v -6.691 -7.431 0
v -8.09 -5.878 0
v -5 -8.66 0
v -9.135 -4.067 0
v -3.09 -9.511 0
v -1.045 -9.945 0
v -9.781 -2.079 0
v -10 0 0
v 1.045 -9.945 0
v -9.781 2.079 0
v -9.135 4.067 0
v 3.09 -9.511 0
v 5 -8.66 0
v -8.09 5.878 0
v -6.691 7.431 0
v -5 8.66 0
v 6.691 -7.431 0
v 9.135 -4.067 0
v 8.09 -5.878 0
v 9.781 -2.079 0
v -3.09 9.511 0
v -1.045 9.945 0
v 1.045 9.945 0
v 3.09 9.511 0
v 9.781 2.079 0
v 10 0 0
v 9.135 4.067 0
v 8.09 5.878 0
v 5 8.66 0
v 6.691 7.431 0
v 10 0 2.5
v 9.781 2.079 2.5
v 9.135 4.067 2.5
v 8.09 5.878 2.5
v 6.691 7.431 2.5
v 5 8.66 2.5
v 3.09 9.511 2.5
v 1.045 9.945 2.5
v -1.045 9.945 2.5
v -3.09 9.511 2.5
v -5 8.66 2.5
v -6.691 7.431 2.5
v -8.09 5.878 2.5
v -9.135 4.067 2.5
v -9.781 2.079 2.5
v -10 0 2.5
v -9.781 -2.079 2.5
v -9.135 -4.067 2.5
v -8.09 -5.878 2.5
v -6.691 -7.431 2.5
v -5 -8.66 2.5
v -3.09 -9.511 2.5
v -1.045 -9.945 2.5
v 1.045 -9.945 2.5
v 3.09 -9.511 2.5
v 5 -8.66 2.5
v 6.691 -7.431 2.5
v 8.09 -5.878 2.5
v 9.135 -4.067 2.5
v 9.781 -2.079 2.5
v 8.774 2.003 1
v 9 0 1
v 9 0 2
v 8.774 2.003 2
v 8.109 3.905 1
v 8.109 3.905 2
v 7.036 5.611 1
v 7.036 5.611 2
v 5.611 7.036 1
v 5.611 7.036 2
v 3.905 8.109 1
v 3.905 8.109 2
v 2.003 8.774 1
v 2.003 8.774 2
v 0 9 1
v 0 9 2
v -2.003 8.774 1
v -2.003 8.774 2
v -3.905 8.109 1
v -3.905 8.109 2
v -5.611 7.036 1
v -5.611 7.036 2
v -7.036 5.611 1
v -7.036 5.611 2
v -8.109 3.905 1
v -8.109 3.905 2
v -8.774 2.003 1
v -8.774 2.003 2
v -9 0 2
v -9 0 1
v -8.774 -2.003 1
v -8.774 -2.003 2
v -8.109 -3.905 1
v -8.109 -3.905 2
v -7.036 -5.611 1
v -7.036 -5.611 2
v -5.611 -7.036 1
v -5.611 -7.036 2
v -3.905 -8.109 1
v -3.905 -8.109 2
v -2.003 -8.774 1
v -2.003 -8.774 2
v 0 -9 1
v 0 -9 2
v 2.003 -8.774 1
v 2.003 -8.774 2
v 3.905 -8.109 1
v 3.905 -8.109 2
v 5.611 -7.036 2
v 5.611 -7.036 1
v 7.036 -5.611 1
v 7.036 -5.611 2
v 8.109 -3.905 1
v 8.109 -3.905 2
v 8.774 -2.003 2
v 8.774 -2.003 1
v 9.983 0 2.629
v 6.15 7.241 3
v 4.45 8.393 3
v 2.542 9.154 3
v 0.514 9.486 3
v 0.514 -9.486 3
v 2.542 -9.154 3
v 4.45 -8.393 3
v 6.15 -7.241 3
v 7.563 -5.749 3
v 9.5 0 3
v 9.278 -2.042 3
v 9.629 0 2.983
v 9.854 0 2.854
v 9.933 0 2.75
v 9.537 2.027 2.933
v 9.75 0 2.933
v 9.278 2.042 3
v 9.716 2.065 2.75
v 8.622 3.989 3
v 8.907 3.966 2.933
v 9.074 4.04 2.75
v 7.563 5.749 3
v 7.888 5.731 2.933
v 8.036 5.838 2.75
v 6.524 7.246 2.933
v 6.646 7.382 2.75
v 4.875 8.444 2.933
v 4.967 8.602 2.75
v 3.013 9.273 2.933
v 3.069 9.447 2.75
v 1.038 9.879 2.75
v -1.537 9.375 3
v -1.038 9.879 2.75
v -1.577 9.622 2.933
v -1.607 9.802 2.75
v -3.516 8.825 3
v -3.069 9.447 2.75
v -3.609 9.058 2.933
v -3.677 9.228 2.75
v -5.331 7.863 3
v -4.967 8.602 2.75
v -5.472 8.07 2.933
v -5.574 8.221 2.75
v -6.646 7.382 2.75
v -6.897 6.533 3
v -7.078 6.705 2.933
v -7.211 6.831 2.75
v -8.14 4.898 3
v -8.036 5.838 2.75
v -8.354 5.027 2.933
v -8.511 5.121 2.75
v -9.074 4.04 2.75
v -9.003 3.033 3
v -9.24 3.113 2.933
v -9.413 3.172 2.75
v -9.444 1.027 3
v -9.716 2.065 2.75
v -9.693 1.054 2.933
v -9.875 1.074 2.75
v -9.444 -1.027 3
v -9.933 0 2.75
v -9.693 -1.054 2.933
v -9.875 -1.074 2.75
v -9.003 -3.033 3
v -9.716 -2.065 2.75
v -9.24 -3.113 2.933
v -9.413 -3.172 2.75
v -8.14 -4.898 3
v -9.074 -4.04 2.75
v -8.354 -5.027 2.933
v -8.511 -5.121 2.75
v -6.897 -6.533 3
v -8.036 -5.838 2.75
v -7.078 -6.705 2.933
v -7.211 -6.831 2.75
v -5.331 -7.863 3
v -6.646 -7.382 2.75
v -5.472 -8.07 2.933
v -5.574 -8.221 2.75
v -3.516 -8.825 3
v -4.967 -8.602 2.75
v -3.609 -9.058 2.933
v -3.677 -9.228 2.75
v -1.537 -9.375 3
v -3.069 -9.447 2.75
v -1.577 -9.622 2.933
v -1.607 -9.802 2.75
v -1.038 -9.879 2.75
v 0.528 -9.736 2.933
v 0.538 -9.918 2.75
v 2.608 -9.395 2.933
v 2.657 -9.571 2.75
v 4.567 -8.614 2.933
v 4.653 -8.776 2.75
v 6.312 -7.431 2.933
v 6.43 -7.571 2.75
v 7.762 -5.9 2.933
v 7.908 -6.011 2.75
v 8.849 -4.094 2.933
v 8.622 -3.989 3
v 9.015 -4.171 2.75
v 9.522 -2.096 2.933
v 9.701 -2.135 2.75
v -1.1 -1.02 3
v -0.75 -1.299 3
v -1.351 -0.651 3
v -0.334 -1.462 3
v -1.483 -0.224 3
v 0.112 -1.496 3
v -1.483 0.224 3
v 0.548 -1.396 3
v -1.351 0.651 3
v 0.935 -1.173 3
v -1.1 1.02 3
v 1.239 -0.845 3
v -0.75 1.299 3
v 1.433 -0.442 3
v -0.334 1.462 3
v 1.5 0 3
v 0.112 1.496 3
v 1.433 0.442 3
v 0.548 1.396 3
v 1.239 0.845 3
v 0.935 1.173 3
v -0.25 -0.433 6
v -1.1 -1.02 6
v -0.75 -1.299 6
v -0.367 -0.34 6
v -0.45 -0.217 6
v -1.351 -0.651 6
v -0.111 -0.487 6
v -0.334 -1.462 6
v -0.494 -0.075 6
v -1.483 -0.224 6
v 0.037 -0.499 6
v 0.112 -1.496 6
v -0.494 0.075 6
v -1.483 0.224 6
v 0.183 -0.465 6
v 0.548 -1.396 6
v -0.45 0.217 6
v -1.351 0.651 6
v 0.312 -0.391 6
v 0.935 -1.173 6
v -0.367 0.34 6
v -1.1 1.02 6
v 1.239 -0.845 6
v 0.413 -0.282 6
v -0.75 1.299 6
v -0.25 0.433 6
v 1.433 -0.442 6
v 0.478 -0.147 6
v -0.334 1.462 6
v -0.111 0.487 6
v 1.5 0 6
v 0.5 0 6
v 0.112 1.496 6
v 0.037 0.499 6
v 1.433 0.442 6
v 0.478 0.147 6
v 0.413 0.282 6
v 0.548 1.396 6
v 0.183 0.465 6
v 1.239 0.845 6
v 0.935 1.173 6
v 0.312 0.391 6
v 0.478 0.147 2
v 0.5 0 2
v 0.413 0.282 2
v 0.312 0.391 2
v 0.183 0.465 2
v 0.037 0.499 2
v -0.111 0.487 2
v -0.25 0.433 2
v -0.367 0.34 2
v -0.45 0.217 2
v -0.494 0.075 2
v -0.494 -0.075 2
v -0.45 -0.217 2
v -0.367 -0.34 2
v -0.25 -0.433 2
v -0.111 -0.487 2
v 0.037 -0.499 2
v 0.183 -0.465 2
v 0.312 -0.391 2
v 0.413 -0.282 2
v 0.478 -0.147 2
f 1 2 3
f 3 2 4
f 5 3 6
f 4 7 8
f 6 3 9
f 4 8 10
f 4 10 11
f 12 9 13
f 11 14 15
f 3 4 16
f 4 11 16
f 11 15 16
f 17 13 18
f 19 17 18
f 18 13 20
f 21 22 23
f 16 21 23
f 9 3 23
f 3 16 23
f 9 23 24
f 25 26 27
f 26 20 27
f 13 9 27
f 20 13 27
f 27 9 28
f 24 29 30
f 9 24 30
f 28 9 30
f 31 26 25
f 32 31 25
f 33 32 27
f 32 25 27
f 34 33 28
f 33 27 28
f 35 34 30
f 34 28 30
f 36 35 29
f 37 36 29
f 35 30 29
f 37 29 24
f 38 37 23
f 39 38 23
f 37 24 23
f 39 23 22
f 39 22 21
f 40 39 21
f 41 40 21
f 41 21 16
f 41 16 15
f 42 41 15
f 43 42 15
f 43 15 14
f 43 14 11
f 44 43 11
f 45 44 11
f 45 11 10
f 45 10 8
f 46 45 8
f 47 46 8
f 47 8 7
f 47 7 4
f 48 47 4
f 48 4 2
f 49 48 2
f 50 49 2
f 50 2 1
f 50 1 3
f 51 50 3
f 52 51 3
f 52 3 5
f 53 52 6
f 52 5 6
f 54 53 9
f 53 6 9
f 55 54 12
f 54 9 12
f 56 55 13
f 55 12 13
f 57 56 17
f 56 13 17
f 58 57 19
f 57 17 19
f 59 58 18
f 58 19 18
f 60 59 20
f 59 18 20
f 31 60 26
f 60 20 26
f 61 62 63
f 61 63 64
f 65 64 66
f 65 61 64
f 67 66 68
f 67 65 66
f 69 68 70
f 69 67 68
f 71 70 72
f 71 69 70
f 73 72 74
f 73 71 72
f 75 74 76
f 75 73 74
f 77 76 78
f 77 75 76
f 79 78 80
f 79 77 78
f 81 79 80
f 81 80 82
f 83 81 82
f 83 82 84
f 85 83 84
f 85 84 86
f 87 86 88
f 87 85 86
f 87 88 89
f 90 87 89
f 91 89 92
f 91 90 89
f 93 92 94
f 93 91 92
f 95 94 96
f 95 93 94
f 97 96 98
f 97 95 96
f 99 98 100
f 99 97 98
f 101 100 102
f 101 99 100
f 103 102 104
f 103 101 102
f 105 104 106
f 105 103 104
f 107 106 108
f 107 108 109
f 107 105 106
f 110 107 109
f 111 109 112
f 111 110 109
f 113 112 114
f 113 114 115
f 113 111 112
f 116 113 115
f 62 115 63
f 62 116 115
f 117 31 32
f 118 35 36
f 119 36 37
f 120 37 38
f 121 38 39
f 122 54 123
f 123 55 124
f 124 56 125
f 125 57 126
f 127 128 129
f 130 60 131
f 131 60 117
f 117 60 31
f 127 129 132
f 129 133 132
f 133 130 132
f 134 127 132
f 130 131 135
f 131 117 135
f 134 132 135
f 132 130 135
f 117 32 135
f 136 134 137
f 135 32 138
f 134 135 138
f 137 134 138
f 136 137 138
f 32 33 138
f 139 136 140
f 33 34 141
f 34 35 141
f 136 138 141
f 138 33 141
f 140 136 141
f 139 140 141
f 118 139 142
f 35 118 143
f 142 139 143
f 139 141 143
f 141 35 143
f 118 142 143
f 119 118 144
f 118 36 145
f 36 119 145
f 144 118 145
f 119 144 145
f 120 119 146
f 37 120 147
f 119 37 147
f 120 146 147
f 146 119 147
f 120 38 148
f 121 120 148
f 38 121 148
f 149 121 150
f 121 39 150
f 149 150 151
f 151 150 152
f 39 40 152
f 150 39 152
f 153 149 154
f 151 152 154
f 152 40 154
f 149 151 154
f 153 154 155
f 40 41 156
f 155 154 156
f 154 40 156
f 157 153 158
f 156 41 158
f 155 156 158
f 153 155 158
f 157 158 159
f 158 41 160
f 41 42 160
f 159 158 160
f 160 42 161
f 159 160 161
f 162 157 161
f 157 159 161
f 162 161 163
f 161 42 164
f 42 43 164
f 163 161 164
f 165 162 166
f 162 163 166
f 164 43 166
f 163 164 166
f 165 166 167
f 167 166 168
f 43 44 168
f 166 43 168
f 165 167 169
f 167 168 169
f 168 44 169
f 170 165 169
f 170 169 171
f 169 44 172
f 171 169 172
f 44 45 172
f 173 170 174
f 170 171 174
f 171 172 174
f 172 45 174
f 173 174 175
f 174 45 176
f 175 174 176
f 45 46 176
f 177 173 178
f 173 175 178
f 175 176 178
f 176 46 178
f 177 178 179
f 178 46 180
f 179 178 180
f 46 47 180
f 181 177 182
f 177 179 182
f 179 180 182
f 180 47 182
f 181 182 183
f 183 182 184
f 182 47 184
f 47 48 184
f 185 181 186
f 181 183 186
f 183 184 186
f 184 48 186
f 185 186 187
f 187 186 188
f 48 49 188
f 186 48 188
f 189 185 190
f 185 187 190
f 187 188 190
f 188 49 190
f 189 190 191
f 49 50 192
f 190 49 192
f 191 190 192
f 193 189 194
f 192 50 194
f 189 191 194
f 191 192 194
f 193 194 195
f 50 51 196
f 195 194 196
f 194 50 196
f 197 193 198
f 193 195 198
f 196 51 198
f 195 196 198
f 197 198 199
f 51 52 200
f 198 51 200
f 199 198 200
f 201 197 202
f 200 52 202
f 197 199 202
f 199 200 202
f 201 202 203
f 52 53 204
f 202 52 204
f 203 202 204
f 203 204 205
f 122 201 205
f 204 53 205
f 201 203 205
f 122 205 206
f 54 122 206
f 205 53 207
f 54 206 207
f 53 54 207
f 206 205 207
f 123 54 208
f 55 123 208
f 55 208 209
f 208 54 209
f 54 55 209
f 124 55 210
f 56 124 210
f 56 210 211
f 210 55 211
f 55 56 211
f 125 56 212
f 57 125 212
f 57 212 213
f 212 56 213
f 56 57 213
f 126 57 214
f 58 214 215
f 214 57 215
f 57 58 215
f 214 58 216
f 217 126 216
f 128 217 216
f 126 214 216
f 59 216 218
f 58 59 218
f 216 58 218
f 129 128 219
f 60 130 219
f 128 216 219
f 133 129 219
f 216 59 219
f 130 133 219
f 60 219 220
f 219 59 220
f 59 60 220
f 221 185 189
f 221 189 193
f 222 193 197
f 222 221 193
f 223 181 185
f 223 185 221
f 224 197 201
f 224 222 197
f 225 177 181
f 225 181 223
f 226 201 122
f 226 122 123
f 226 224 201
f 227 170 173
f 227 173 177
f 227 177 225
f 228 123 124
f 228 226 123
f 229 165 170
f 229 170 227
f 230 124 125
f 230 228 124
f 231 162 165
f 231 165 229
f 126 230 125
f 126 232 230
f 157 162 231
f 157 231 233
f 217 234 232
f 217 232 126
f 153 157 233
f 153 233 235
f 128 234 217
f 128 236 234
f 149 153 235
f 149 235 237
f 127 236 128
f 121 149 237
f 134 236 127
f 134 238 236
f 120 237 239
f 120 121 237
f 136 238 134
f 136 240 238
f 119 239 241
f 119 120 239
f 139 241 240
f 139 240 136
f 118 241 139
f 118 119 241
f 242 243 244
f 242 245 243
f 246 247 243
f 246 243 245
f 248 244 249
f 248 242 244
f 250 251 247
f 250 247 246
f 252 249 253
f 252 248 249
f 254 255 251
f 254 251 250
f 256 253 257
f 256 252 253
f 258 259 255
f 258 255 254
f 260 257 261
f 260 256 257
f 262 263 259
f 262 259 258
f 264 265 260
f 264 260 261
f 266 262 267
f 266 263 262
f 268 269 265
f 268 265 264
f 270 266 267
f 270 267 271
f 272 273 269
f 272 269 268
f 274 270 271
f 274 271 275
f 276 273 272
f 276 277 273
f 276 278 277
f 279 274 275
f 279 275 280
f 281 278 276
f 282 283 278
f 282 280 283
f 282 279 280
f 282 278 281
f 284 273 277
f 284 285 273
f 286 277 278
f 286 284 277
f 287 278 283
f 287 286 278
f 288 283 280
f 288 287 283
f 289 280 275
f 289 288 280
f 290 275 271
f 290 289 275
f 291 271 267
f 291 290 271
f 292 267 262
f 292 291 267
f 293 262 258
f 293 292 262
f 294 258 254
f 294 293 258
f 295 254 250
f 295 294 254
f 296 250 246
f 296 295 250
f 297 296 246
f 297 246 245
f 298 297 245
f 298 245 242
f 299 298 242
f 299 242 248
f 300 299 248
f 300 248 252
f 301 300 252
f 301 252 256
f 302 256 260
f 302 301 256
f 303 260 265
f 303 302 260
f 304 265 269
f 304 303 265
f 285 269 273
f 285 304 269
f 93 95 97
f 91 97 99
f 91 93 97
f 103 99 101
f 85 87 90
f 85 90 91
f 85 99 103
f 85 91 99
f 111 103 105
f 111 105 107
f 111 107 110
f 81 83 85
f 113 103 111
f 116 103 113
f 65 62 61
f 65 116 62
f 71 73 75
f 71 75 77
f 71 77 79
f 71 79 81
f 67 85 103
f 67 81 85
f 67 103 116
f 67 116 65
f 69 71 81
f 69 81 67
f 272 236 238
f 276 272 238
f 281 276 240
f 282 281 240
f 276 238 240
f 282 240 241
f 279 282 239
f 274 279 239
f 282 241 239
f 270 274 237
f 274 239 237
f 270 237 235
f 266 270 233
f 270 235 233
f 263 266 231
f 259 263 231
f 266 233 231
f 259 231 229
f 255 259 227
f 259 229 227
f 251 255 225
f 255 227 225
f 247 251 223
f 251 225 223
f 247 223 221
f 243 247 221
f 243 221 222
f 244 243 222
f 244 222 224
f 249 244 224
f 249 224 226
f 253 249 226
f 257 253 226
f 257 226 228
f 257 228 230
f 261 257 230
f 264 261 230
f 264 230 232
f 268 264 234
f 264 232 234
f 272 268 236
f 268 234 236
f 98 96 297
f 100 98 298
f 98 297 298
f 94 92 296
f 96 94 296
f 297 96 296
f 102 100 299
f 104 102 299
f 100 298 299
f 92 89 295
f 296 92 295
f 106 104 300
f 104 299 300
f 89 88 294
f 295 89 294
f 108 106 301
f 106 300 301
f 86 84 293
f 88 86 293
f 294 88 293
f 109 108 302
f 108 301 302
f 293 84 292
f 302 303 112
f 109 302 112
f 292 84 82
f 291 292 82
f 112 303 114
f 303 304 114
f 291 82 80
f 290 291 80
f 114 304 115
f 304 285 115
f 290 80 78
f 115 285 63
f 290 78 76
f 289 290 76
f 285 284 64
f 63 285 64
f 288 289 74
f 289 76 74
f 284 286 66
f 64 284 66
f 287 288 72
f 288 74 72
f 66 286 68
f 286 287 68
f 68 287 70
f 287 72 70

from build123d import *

# Parameters (mm, degrees)
F0_R     = 10
F1_DEPTH = 1
F2_R     = 10
F2_R_2   = 9
F3_DEPTH = 1
F4_R     = 10
F4_R_2   = 0.5
F5_DEPTH = 1
F6_R     = 1.5
F6_R_2   = 0.5
F7_DEPTH = 3
F8_R     = 0.5


with BuildPart() as f1:
    # F0 (on Top) → F1 (new body)
    with BuildSketch(Plane.XY):
        Circle(F0_R)
    extrude(amount=F1_DEPTH)

    # F2 (on face) → F3 (join)
    with BuildSketch(Plane.XY.offset(1)):
        Circle(F2_R)
        Circle(F2_R_2, mode=Mode.SUBTRACT)
    extrude(amount=F3_DEPTH)

    # F4 (on face) → F5 (join)
    with BuildSketch(Plane.XY.offset(2)):
        Circle(F4_R)
        Circle(F4_R_2, mode=Mode.SUBTRACT)
    extrude(amount=F5_DEPTH)

    # F6 (on face) → F7 (join)
    with BuildSketch(Plane.XY.offset(3)):
        Circle(F6_R)
        Circle(F6_R_2, mode=Mode.SUBTRACT)
    extrude(amount=F7_DEPTH)

    # F8
    f8_edges = [f1.edges().sort_by_distance(p)[0] for p in [
        (-10, 0, 3),
    ]]
    fillet(f8_edges, radius=F8_R)


solid = f1.part
